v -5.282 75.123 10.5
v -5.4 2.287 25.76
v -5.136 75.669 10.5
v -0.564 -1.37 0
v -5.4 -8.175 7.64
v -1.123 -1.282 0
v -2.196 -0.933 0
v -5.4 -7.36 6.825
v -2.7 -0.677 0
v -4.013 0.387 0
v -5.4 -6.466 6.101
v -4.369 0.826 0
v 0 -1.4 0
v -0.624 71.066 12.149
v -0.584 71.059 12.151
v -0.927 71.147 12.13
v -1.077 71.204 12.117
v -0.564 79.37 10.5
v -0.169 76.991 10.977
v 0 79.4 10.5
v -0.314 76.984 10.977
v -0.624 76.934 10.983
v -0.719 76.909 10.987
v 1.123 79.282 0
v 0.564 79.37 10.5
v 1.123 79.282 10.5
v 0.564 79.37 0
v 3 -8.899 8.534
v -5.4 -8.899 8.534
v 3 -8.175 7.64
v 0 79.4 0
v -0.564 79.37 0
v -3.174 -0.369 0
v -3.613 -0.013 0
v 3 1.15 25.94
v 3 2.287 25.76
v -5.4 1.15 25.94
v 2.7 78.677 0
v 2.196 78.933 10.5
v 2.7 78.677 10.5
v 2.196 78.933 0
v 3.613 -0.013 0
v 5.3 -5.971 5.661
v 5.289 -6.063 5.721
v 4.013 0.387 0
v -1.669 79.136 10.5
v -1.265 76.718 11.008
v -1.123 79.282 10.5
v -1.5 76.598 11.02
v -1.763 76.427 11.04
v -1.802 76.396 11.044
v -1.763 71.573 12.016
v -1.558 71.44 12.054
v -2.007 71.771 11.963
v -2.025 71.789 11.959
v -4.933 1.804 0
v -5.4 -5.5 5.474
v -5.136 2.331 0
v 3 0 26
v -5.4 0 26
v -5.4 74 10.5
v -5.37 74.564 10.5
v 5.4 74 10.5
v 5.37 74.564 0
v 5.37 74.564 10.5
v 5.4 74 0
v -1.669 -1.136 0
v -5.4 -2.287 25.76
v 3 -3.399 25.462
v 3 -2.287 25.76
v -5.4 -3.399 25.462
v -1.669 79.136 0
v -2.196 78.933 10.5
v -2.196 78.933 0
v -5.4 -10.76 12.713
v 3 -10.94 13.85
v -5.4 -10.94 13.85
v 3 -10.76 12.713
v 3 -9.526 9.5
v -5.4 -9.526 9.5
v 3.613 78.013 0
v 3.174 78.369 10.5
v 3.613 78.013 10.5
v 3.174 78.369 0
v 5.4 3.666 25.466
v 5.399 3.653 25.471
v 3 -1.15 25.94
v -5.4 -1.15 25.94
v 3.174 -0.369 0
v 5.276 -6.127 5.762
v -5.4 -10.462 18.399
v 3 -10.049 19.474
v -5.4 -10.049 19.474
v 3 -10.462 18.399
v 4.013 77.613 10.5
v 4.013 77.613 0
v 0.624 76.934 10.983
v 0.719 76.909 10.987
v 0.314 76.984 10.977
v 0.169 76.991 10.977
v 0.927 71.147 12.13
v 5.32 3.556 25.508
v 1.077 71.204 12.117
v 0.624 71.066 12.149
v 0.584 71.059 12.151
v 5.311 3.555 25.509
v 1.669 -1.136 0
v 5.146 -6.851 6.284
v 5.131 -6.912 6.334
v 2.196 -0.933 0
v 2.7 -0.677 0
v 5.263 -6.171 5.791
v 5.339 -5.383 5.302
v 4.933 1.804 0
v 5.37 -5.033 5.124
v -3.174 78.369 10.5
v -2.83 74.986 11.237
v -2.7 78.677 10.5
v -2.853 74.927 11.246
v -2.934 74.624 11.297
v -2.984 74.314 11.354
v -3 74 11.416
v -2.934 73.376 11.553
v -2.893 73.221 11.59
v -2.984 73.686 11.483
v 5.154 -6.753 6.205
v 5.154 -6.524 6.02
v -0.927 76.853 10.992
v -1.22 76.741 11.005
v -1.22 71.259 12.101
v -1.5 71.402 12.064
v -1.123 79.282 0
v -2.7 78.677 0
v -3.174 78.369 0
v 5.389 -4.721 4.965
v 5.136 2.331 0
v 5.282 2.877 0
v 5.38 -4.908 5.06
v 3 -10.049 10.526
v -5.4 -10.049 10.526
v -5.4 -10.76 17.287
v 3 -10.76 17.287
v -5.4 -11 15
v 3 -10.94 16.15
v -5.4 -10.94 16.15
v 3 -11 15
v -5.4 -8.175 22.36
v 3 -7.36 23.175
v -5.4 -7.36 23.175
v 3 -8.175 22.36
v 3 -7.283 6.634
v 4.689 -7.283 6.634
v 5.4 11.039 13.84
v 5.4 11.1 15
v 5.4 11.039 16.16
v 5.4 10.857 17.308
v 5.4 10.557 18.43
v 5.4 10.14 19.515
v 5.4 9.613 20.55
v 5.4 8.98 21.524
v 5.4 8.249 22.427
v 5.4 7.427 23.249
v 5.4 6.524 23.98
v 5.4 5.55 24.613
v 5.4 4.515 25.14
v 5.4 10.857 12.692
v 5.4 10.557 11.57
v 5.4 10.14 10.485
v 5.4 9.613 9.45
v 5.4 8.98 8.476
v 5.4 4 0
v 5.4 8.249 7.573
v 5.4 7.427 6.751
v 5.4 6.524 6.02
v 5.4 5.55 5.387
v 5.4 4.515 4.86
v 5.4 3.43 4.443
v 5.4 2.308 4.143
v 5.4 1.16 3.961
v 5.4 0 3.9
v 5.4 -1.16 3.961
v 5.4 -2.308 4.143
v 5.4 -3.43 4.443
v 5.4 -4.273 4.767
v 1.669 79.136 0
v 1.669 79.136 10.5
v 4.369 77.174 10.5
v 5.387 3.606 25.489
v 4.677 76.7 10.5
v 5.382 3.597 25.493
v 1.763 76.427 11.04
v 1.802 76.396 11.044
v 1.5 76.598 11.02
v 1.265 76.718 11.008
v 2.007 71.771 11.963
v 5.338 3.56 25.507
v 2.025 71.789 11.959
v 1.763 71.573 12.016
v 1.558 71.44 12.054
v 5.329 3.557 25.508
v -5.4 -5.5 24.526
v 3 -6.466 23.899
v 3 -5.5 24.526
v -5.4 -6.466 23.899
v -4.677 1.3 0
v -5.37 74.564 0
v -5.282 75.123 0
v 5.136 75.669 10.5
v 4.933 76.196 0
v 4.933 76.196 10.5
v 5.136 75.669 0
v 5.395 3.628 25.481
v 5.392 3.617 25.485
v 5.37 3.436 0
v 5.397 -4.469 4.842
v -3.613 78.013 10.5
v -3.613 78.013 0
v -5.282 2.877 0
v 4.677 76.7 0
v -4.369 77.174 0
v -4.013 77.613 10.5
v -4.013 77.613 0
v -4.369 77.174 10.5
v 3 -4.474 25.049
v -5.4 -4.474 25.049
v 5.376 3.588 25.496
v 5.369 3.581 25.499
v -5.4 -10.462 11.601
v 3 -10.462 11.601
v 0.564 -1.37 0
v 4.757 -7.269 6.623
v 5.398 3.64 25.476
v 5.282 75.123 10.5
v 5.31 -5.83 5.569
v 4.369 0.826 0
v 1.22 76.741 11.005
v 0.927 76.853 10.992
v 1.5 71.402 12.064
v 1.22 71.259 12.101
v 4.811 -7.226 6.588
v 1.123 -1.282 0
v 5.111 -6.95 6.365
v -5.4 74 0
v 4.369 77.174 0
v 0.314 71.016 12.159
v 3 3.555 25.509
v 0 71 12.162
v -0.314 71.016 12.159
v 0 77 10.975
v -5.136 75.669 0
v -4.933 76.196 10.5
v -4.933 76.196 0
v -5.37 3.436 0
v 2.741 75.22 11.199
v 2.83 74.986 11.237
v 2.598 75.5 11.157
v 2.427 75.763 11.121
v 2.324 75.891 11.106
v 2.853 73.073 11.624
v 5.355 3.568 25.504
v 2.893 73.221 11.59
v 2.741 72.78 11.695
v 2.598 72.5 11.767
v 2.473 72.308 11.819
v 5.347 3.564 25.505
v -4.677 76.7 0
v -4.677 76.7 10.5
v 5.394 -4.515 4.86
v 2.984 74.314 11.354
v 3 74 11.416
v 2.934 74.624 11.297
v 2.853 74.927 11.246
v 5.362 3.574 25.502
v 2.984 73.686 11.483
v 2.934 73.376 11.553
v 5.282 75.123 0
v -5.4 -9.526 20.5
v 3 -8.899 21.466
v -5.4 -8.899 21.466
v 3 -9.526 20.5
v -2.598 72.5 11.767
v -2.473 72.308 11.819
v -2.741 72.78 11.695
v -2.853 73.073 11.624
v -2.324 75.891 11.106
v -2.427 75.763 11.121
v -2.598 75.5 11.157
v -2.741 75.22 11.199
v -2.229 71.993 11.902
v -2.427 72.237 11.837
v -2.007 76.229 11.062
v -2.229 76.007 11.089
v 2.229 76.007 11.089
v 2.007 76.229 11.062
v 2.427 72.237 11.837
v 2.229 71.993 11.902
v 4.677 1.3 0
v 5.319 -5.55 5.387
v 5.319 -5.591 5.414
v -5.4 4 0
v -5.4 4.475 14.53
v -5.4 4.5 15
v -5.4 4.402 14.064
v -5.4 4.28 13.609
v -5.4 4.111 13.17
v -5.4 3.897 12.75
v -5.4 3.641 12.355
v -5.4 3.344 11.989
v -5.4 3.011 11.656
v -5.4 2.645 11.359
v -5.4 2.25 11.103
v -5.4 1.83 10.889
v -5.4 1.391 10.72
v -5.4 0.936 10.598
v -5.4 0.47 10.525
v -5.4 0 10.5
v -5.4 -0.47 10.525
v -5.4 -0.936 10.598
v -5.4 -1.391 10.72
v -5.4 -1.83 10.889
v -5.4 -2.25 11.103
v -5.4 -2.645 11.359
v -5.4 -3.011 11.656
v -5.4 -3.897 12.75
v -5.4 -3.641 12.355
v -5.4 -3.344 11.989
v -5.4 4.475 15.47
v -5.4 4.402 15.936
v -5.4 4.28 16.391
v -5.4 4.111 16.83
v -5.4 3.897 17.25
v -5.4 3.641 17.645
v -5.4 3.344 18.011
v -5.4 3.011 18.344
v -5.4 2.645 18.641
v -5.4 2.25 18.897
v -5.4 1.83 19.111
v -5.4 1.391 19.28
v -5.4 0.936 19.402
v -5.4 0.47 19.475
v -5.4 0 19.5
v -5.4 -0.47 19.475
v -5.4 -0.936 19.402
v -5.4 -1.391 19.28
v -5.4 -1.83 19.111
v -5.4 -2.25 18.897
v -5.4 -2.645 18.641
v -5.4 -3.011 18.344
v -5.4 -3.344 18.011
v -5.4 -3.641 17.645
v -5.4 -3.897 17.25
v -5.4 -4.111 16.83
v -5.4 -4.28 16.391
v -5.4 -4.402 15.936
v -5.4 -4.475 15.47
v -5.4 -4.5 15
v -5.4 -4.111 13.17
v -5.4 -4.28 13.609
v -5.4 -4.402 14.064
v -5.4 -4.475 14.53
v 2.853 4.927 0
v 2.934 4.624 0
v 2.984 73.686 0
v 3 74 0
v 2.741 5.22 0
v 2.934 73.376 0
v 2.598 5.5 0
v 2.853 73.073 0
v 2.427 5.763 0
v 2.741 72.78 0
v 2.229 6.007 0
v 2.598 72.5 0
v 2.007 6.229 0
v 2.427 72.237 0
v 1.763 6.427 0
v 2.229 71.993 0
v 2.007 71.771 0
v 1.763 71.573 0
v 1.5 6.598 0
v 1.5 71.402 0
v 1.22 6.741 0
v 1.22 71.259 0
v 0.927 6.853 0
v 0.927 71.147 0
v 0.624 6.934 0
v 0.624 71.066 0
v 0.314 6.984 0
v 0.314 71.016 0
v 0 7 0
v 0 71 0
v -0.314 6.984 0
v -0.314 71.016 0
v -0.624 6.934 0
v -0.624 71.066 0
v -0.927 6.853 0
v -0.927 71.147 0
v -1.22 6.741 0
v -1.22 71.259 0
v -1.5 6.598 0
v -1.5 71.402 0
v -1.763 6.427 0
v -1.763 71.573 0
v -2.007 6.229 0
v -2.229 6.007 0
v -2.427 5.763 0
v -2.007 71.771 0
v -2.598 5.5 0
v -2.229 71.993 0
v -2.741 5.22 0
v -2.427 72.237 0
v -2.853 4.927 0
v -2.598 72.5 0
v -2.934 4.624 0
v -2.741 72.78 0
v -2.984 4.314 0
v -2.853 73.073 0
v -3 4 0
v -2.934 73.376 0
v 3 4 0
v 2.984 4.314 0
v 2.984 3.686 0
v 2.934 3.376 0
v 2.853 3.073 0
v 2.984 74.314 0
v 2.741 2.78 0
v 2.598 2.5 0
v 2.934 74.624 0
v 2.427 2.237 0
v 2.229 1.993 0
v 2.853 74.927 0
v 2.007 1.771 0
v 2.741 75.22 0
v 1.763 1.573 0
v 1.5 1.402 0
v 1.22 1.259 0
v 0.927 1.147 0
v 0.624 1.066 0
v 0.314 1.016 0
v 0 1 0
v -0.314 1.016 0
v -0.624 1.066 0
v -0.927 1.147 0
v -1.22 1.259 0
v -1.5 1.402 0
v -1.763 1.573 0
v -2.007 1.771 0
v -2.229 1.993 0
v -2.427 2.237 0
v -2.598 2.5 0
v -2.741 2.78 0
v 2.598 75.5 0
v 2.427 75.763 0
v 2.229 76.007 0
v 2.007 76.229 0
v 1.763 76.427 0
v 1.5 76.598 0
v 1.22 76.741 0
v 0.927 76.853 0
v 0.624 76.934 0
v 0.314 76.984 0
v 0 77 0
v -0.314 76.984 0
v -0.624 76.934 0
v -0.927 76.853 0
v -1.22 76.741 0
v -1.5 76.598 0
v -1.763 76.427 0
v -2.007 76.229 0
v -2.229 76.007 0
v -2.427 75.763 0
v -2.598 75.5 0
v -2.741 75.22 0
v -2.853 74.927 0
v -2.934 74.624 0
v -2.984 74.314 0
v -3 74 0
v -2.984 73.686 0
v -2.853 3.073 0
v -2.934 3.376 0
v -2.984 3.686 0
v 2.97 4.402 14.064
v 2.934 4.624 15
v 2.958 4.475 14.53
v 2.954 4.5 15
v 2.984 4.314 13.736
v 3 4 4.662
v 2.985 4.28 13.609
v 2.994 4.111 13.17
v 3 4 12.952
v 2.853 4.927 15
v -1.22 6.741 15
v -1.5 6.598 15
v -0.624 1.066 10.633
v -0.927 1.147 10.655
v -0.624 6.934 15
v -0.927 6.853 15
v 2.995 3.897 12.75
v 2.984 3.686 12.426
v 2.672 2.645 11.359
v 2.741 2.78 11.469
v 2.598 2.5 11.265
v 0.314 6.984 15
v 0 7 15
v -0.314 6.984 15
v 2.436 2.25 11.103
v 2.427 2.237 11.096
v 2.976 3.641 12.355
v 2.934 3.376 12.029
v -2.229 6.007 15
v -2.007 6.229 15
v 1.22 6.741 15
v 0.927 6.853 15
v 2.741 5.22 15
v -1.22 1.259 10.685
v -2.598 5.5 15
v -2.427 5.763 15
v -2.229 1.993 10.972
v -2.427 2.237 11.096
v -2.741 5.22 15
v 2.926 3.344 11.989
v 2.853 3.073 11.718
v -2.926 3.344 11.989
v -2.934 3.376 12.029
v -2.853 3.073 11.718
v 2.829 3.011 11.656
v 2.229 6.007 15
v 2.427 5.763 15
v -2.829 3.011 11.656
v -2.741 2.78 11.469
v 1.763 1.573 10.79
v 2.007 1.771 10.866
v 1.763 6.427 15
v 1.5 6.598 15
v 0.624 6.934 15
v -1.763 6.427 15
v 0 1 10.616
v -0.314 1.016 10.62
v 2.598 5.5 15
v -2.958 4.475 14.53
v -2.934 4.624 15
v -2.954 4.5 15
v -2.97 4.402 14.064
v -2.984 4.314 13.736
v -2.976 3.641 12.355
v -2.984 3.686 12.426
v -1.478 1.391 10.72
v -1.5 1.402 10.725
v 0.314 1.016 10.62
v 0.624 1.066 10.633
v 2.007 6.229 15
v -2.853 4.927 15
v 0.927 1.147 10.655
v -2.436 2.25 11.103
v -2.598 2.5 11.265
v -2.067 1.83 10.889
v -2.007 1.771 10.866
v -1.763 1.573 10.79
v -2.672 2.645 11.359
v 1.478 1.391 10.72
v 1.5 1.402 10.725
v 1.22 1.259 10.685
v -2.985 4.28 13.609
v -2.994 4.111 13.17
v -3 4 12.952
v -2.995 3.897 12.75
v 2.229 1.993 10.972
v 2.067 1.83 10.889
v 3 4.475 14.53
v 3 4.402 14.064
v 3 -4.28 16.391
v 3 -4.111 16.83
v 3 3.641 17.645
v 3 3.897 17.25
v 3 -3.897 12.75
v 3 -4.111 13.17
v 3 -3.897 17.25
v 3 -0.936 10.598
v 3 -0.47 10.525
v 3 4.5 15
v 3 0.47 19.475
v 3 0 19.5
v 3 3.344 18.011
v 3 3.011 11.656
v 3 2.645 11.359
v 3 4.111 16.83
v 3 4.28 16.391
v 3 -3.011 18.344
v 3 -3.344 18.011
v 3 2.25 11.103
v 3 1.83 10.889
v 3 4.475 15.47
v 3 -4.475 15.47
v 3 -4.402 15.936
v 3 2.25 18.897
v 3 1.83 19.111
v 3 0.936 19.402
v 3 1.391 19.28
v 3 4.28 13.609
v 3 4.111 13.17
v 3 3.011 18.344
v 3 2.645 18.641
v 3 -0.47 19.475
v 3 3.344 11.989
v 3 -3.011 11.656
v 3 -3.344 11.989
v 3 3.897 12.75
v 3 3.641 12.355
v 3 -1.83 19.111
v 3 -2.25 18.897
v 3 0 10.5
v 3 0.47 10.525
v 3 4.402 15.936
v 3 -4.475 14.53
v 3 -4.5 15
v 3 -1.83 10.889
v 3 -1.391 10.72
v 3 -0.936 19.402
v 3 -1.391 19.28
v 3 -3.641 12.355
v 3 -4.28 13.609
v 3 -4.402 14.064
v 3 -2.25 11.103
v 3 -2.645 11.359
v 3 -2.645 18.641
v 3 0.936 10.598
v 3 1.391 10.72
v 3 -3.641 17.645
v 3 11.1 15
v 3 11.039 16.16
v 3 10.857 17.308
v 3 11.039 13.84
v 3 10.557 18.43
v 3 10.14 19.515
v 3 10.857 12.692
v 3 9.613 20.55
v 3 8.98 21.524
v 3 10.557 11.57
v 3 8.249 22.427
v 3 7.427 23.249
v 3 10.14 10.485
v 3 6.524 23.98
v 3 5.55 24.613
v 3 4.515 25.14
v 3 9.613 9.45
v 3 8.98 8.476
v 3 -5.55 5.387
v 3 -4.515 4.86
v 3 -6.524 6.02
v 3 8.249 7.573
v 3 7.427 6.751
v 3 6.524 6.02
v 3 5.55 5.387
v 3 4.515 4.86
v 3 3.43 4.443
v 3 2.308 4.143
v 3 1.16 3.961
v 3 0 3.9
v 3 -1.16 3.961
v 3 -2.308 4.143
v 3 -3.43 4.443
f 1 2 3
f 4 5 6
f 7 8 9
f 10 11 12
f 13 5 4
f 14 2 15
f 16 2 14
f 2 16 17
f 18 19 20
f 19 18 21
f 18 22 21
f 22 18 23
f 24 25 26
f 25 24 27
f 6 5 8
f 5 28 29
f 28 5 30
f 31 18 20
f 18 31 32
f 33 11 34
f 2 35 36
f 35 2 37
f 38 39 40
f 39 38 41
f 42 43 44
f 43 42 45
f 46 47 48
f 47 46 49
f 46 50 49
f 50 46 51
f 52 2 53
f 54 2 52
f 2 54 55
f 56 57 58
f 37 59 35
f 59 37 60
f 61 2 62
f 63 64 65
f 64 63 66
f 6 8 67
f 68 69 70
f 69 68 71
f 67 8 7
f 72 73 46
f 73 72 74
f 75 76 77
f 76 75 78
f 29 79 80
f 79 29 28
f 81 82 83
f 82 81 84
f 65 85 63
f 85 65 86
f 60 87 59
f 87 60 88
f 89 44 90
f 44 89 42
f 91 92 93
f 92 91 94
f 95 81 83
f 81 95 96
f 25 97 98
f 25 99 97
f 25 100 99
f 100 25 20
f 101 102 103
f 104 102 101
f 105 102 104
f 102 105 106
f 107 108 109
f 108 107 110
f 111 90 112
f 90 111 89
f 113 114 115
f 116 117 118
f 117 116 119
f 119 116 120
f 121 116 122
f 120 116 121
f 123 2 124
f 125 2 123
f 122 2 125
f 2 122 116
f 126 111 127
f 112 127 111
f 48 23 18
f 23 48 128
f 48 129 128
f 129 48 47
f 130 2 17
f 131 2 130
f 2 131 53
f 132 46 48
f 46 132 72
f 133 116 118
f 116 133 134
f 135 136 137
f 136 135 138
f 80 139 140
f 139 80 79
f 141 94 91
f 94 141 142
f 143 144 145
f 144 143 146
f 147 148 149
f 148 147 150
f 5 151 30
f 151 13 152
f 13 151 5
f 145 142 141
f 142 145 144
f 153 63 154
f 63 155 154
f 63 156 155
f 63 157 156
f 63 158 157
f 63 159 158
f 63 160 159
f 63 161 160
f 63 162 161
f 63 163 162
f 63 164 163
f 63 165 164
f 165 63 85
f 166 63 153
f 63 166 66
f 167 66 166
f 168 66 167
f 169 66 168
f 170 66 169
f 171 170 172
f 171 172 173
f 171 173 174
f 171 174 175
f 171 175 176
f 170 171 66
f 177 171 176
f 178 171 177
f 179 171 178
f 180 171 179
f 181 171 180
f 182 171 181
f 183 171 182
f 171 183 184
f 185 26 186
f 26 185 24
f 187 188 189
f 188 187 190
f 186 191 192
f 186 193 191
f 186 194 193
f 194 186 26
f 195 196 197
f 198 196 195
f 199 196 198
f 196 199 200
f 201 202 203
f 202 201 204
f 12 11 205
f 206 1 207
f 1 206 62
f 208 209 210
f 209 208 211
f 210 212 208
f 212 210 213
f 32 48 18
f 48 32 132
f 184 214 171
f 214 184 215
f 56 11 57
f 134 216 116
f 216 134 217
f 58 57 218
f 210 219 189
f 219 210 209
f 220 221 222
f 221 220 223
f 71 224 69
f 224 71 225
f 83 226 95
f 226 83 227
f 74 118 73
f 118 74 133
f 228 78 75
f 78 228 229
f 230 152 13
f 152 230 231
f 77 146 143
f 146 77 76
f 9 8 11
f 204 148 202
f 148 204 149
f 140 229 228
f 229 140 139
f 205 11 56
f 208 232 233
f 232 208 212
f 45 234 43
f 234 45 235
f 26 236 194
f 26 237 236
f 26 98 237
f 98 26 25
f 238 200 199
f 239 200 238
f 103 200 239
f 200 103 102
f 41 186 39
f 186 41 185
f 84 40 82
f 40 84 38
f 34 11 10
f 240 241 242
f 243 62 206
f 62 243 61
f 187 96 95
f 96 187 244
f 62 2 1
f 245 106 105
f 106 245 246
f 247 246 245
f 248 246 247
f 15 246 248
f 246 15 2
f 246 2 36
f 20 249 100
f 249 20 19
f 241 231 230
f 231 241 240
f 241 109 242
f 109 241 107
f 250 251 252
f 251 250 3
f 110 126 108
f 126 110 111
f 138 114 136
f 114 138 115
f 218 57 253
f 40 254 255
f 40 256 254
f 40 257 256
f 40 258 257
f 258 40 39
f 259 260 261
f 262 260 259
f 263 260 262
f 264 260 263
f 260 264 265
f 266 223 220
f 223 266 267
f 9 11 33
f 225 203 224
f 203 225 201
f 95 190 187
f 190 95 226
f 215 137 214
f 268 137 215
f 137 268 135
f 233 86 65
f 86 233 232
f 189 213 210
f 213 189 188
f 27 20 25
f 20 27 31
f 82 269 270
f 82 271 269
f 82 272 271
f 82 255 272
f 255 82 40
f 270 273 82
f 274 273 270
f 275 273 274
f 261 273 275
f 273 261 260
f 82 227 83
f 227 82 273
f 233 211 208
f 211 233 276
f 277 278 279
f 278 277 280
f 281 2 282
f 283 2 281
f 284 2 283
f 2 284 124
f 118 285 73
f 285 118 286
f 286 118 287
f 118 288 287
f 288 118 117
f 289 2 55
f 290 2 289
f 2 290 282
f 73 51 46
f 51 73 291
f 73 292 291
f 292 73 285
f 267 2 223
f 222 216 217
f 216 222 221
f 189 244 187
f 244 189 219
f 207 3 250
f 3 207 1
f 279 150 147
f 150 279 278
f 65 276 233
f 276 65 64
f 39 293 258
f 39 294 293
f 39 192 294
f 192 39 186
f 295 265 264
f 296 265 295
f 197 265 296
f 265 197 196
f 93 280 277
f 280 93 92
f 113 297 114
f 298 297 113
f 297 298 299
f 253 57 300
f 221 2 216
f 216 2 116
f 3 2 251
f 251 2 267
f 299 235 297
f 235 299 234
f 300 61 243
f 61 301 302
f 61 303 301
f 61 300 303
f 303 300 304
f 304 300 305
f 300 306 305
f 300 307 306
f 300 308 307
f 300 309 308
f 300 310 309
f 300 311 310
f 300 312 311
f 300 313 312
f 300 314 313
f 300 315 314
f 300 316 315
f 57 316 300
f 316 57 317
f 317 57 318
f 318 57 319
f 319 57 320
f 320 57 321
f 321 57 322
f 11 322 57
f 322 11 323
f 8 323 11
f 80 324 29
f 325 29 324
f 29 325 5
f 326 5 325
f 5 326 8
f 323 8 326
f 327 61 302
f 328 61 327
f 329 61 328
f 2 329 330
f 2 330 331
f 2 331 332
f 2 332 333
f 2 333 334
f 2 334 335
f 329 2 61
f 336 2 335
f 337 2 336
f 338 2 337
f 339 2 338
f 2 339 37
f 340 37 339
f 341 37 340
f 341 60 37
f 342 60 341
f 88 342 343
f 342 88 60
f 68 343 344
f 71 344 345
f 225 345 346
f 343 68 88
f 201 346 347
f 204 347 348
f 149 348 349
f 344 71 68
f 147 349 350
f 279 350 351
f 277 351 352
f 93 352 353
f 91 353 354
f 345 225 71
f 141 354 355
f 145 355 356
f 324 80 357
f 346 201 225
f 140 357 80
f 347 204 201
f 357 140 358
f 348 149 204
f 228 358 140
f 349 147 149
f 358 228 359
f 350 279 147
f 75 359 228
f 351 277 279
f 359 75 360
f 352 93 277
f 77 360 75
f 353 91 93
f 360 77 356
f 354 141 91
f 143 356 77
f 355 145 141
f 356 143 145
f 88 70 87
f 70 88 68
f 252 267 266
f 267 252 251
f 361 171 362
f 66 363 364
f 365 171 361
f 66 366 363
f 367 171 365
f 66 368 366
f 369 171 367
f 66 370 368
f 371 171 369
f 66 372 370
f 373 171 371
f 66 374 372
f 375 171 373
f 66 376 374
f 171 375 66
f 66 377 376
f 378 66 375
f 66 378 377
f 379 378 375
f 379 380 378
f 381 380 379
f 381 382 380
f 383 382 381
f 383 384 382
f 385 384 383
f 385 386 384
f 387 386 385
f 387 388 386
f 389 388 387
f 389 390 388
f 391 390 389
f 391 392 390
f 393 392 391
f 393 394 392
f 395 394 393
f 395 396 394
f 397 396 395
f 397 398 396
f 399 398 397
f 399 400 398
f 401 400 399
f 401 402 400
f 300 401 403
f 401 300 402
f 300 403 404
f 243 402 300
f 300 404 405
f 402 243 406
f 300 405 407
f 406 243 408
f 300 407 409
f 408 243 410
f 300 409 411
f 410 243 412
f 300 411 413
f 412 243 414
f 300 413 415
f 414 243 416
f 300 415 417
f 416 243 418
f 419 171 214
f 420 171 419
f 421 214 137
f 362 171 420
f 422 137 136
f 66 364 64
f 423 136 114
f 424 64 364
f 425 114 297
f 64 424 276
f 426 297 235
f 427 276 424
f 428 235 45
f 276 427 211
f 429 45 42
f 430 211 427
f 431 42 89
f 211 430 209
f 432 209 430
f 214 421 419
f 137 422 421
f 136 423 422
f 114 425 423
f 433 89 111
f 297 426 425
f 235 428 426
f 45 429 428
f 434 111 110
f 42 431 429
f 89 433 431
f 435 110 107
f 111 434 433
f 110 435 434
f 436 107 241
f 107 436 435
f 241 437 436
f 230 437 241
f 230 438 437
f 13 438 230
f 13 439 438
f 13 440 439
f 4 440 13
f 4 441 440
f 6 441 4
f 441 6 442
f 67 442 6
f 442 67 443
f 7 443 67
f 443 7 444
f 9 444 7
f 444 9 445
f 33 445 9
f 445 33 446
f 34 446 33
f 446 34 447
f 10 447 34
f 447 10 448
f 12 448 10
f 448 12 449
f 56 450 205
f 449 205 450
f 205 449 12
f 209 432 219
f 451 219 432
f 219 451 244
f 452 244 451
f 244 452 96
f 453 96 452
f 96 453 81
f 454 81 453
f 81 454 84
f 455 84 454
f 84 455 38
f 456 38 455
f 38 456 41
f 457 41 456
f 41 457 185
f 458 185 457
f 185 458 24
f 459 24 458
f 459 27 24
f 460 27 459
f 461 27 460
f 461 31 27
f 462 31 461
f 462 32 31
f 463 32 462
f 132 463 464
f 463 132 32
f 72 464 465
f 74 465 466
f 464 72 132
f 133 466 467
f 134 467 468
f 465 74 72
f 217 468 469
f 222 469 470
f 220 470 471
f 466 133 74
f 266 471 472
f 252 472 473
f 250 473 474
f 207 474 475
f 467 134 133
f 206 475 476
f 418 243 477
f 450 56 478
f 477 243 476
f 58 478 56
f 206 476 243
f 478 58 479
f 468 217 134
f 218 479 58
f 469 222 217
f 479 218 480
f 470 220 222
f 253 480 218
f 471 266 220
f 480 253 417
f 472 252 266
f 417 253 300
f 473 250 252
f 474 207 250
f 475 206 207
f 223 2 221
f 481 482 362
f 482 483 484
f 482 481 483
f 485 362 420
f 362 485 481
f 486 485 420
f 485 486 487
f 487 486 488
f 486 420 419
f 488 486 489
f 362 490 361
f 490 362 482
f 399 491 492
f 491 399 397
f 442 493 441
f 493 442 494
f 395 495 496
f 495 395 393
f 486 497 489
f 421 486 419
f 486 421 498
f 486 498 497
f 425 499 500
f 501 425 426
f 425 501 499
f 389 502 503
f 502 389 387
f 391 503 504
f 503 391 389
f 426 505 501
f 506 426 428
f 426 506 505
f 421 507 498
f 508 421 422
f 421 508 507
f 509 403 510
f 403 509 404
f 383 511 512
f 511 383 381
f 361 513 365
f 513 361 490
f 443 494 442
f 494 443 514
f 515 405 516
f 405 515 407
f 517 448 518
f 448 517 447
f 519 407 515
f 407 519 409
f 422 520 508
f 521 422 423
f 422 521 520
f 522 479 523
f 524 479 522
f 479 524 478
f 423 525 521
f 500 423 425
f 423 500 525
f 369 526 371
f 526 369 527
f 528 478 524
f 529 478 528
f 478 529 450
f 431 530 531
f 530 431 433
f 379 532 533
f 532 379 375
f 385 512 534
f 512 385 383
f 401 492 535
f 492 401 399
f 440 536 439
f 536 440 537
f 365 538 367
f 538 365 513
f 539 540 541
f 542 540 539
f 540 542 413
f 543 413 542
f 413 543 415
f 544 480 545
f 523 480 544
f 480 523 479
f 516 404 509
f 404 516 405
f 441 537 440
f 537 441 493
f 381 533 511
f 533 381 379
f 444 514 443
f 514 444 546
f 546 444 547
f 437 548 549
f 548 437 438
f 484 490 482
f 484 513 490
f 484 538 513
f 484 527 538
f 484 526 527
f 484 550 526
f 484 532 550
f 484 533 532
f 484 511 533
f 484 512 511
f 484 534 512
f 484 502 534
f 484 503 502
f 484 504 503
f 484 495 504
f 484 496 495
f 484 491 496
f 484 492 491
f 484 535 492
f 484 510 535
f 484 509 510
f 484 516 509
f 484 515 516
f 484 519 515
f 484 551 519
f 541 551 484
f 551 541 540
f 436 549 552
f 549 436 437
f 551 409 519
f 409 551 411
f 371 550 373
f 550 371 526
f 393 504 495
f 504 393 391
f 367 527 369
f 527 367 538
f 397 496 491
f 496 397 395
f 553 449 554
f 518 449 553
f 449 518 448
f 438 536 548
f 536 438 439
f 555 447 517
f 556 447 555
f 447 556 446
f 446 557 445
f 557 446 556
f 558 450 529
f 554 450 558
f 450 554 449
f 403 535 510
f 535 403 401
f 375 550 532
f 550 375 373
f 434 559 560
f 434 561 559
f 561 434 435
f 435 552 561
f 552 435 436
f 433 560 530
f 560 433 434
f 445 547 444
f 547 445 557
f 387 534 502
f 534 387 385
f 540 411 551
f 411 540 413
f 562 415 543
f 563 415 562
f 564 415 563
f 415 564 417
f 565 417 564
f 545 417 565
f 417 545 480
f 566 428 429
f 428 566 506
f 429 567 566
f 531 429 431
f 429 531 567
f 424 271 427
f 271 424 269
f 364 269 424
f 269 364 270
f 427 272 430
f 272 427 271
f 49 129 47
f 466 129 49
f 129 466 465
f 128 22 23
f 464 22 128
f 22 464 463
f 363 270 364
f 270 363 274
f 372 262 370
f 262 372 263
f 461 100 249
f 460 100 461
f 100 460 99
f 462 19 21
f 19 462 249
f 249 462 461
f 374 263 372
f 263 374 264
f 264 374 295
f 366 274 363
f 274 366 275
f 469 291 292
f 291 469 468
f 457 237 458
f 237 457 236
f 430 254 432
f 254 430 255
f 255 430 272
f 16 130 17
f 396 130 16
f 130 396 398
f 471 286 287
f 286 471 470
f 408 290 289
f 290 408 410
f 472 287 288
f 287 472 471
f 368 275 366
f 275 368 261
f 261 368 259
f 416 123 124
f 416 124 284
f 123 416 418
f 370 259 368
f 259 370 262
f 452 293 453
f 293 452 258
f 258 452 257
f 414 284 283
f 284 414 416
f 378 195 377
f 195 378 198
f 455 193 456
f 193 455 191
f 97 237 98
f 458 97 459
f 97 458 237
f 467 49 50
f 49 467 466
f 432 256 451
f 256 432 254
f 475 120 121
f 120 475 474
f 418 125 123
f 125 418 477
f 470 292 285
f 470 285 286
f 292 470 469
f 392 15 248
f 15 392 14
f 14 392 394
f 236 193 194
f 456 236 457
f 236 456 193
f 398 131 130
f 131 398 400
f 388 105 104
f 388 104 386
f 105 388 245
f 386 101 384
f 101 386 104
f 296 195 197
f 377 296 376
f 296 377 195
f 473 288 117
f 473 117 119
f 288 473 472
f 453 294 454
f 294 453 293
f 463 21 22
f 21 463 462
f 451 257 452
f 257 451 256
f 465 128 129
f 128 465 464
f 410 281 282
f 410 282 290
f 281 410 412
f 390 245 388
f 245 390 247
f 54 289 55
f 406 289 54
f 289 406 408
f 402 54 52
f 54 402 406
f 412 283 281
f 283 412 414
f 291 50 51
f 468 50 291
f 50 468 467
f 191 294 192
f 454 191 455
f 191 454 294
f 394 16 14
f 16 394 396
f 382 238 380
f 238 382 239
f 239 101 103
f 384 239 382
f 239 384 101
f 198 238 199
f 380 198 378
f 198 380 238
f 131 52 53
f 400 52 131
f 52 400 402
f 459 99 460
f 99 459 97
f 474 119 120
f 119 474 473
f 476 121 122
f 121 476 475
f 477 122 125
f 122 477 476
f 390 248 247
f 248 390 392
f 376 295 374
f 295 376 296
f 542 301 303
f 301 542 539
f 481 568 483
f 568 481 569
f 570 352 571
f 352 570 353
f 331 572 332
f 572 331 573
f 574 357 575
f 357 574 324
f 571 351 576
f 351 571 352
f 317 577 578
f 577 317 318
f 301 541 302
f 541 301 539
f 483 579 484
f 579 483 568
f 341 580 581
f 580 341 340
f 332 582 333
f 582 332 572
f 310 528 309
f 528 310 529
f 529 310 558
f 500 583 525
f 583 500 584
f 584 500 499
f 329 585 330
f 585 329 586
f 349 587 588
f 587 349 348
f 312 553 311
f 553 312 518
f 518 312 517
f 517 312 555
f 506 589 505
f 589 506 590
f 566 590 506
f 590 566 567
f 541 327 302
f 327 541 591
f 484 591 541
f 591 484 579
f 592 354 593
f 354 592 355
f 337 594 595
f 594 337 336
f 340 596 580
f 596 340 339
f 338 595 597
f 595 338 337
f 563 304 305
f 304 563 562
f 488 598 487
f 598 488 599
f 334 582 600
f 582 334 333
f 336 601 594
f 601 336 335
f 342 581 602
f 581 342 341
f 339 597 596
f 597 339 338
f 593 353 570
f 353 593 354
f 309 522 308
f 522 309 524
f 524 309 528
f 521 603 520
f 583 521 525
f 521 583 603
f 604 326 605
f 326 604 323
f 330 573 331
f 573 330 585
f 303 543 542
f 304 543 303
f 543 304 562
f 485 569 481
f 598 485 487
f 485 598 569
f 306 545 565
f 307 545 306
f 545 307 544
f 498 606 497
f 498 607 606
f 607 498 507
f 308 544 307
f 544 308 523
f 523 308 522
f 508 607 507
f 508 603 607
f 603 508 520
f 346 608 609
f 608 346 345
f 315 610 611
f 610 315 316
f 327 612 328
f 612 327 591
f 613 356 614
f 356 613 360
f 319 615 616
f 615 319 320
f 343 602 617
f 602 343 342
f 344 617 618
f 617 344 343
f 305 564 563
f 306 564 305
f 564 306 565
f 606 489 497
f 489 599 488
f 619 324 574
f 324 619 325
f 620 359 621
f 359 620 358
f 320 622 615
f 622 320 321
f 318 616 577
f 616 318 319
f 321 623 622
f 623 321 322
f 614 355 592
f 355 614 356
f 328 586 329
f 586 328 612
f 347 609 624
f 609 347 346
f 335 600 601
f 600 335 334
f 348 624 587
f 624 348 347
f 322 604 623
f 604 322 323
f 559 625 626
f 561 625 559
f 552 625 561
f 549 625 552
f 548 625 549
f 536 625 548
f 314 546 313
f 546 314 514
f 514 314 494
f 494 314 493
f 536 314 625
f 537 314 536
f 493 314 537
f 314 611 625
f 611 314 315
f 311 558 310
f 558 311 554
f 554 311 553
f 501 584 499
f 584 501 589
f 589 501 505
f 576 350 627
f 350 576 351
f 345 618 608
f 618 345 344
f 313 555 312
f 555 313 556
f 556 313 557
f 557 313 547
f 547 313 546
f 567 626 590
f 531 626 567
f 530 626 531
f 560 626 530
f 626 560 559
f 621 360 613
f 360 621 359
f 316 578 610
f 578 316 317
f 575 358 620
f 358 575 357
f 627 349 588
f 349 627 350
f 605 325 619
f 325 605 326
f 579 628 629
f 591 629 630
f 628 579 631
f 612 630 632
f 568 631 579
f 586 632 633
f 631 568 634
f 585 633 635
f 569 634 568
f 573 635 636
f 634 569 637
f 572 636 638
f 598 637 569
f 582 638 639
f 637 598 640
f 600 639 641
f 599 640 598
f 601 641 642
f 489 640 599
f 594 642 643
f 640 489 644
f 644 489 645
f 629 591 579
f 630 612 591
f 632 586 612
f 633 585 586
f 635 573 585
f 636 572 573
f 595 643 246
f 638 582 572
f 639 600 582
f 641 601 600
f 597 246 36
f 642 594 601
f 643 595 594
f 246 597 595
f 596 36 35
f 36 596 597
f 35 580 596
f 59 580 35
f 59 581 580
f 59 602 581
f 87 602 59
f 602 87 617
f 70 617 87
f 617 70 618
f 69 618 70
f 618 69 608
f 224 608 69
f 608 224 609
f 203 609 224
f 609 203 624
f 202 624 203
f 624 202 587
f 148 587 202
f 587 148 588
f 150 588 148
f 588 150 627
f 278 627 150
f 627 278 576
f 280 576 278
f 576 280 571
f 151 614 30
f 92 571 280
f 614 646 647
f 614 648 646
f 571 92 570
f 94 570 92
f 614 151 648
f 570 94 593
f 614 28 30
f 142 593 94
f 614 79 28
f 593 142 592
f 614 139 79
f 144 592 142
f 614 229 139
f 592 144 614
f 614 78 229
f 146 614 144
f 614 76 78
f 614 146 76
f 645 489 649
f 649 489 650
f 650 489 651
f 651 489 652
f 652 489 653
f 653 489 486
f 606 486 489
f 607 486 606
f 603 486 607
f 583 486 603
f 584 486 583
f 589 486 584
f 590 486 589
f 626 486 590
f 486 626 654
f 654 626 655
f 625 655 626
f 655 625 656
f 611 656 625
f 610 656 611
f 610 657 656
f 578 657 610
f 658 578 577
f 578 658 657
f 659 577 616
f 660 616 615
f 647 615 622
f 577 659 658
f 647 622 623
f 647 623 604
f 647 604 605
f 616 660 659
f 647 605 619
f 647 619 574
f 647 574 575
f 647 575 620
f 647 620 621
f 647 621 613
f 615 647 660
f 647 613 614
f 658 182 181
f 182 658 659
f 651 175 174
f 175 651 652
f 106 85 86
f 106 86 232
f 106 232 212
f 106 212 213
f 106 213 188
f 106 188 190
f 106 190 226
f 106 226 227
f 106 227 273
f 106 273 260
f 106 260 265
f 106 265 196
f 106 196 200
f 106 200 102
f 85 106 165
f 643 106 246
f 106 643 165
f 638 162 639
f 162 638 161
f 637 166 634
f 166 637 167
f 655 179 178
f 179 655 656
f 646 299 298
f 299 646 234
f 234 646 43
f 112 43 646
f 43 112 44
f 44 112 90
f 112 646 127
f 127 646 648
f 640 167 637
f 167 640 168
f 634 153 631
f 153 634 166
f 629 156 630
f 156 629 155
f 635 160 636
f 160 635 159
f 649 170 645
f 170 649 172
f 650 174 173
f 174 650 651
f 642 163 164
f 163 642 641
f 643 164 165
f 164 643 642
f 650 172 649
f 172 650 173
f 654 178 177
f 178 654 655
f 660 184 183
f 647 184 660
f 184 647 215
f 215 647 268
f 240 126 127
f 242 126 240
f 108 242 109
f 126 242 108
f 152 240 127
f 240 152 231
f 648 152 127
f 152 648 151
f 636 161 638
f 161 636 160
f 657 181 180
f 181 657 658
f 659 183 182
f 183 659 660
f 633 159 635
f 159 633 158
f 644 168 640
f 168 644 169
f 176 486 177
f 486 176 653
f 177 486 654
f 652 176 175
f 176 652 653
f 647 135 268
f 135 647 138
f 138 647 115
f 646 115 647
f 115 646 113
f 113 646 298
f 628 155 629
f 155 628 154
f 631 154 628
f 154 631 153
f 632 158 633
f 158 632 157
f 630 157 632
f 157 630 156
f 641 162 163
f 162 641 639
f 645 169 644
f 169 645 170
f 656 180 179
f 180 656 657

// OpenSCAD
$fn=60;
mount_d=30;
mount_inner_d=22;
mount_hole=9;

plate_hole=6;
filament=1.2;
plate_d=plate_hole+filament*4;
plate_h=mount_d/2-mount_hole/2;

plate_offset=4;

plate_gap=70;

pad=0.1;
padd=pad*2;

sink_d=22;
sink_h=(plate_d-plate_hole)/2+pad;

lip=4;

difference() {
    hull() {
        //far plate
        translate([0,plate_gap+plate_offset,0])
        cylinder(d=plate_d,h=plate_h);
        //near plate
        translate([0,plate_offset,0])
        cylinder(d=plate_d,h=plate_h);
        //mount
        translate([plate_d/2,0,mount_d/2])
        rotate([0,-90,0])
        cylinder(d=mount_inner_d,h=plate_d);
    }

    //near hole
    translate([0,plate_offset,-pad])
    cylinder(d=plate_hole,h=mount_d/2+pad);
    //far hole
    translate([0,plate_gap+plate_offset,-pad])
    cylinder(d=plate_hole,h=mount_d);
    //far flange
    //translate([0,plate_gap,plate_h])
    //cylinder(d1=plate_d-lip,d2=plate_d*3,h=plate_d);

    //mount hole
    translate([plate_d/2+pad,0,mount_d/2])
    rotate([0,-90,0])
    cylinder(d=mount_hole,h=plate_d+padd);

    translate([plate_d/2+pad,0,mount_d/2])
    rotate([0,-90,0])
    cylinder(d=sink_d+padd,h=sink_h);
}
